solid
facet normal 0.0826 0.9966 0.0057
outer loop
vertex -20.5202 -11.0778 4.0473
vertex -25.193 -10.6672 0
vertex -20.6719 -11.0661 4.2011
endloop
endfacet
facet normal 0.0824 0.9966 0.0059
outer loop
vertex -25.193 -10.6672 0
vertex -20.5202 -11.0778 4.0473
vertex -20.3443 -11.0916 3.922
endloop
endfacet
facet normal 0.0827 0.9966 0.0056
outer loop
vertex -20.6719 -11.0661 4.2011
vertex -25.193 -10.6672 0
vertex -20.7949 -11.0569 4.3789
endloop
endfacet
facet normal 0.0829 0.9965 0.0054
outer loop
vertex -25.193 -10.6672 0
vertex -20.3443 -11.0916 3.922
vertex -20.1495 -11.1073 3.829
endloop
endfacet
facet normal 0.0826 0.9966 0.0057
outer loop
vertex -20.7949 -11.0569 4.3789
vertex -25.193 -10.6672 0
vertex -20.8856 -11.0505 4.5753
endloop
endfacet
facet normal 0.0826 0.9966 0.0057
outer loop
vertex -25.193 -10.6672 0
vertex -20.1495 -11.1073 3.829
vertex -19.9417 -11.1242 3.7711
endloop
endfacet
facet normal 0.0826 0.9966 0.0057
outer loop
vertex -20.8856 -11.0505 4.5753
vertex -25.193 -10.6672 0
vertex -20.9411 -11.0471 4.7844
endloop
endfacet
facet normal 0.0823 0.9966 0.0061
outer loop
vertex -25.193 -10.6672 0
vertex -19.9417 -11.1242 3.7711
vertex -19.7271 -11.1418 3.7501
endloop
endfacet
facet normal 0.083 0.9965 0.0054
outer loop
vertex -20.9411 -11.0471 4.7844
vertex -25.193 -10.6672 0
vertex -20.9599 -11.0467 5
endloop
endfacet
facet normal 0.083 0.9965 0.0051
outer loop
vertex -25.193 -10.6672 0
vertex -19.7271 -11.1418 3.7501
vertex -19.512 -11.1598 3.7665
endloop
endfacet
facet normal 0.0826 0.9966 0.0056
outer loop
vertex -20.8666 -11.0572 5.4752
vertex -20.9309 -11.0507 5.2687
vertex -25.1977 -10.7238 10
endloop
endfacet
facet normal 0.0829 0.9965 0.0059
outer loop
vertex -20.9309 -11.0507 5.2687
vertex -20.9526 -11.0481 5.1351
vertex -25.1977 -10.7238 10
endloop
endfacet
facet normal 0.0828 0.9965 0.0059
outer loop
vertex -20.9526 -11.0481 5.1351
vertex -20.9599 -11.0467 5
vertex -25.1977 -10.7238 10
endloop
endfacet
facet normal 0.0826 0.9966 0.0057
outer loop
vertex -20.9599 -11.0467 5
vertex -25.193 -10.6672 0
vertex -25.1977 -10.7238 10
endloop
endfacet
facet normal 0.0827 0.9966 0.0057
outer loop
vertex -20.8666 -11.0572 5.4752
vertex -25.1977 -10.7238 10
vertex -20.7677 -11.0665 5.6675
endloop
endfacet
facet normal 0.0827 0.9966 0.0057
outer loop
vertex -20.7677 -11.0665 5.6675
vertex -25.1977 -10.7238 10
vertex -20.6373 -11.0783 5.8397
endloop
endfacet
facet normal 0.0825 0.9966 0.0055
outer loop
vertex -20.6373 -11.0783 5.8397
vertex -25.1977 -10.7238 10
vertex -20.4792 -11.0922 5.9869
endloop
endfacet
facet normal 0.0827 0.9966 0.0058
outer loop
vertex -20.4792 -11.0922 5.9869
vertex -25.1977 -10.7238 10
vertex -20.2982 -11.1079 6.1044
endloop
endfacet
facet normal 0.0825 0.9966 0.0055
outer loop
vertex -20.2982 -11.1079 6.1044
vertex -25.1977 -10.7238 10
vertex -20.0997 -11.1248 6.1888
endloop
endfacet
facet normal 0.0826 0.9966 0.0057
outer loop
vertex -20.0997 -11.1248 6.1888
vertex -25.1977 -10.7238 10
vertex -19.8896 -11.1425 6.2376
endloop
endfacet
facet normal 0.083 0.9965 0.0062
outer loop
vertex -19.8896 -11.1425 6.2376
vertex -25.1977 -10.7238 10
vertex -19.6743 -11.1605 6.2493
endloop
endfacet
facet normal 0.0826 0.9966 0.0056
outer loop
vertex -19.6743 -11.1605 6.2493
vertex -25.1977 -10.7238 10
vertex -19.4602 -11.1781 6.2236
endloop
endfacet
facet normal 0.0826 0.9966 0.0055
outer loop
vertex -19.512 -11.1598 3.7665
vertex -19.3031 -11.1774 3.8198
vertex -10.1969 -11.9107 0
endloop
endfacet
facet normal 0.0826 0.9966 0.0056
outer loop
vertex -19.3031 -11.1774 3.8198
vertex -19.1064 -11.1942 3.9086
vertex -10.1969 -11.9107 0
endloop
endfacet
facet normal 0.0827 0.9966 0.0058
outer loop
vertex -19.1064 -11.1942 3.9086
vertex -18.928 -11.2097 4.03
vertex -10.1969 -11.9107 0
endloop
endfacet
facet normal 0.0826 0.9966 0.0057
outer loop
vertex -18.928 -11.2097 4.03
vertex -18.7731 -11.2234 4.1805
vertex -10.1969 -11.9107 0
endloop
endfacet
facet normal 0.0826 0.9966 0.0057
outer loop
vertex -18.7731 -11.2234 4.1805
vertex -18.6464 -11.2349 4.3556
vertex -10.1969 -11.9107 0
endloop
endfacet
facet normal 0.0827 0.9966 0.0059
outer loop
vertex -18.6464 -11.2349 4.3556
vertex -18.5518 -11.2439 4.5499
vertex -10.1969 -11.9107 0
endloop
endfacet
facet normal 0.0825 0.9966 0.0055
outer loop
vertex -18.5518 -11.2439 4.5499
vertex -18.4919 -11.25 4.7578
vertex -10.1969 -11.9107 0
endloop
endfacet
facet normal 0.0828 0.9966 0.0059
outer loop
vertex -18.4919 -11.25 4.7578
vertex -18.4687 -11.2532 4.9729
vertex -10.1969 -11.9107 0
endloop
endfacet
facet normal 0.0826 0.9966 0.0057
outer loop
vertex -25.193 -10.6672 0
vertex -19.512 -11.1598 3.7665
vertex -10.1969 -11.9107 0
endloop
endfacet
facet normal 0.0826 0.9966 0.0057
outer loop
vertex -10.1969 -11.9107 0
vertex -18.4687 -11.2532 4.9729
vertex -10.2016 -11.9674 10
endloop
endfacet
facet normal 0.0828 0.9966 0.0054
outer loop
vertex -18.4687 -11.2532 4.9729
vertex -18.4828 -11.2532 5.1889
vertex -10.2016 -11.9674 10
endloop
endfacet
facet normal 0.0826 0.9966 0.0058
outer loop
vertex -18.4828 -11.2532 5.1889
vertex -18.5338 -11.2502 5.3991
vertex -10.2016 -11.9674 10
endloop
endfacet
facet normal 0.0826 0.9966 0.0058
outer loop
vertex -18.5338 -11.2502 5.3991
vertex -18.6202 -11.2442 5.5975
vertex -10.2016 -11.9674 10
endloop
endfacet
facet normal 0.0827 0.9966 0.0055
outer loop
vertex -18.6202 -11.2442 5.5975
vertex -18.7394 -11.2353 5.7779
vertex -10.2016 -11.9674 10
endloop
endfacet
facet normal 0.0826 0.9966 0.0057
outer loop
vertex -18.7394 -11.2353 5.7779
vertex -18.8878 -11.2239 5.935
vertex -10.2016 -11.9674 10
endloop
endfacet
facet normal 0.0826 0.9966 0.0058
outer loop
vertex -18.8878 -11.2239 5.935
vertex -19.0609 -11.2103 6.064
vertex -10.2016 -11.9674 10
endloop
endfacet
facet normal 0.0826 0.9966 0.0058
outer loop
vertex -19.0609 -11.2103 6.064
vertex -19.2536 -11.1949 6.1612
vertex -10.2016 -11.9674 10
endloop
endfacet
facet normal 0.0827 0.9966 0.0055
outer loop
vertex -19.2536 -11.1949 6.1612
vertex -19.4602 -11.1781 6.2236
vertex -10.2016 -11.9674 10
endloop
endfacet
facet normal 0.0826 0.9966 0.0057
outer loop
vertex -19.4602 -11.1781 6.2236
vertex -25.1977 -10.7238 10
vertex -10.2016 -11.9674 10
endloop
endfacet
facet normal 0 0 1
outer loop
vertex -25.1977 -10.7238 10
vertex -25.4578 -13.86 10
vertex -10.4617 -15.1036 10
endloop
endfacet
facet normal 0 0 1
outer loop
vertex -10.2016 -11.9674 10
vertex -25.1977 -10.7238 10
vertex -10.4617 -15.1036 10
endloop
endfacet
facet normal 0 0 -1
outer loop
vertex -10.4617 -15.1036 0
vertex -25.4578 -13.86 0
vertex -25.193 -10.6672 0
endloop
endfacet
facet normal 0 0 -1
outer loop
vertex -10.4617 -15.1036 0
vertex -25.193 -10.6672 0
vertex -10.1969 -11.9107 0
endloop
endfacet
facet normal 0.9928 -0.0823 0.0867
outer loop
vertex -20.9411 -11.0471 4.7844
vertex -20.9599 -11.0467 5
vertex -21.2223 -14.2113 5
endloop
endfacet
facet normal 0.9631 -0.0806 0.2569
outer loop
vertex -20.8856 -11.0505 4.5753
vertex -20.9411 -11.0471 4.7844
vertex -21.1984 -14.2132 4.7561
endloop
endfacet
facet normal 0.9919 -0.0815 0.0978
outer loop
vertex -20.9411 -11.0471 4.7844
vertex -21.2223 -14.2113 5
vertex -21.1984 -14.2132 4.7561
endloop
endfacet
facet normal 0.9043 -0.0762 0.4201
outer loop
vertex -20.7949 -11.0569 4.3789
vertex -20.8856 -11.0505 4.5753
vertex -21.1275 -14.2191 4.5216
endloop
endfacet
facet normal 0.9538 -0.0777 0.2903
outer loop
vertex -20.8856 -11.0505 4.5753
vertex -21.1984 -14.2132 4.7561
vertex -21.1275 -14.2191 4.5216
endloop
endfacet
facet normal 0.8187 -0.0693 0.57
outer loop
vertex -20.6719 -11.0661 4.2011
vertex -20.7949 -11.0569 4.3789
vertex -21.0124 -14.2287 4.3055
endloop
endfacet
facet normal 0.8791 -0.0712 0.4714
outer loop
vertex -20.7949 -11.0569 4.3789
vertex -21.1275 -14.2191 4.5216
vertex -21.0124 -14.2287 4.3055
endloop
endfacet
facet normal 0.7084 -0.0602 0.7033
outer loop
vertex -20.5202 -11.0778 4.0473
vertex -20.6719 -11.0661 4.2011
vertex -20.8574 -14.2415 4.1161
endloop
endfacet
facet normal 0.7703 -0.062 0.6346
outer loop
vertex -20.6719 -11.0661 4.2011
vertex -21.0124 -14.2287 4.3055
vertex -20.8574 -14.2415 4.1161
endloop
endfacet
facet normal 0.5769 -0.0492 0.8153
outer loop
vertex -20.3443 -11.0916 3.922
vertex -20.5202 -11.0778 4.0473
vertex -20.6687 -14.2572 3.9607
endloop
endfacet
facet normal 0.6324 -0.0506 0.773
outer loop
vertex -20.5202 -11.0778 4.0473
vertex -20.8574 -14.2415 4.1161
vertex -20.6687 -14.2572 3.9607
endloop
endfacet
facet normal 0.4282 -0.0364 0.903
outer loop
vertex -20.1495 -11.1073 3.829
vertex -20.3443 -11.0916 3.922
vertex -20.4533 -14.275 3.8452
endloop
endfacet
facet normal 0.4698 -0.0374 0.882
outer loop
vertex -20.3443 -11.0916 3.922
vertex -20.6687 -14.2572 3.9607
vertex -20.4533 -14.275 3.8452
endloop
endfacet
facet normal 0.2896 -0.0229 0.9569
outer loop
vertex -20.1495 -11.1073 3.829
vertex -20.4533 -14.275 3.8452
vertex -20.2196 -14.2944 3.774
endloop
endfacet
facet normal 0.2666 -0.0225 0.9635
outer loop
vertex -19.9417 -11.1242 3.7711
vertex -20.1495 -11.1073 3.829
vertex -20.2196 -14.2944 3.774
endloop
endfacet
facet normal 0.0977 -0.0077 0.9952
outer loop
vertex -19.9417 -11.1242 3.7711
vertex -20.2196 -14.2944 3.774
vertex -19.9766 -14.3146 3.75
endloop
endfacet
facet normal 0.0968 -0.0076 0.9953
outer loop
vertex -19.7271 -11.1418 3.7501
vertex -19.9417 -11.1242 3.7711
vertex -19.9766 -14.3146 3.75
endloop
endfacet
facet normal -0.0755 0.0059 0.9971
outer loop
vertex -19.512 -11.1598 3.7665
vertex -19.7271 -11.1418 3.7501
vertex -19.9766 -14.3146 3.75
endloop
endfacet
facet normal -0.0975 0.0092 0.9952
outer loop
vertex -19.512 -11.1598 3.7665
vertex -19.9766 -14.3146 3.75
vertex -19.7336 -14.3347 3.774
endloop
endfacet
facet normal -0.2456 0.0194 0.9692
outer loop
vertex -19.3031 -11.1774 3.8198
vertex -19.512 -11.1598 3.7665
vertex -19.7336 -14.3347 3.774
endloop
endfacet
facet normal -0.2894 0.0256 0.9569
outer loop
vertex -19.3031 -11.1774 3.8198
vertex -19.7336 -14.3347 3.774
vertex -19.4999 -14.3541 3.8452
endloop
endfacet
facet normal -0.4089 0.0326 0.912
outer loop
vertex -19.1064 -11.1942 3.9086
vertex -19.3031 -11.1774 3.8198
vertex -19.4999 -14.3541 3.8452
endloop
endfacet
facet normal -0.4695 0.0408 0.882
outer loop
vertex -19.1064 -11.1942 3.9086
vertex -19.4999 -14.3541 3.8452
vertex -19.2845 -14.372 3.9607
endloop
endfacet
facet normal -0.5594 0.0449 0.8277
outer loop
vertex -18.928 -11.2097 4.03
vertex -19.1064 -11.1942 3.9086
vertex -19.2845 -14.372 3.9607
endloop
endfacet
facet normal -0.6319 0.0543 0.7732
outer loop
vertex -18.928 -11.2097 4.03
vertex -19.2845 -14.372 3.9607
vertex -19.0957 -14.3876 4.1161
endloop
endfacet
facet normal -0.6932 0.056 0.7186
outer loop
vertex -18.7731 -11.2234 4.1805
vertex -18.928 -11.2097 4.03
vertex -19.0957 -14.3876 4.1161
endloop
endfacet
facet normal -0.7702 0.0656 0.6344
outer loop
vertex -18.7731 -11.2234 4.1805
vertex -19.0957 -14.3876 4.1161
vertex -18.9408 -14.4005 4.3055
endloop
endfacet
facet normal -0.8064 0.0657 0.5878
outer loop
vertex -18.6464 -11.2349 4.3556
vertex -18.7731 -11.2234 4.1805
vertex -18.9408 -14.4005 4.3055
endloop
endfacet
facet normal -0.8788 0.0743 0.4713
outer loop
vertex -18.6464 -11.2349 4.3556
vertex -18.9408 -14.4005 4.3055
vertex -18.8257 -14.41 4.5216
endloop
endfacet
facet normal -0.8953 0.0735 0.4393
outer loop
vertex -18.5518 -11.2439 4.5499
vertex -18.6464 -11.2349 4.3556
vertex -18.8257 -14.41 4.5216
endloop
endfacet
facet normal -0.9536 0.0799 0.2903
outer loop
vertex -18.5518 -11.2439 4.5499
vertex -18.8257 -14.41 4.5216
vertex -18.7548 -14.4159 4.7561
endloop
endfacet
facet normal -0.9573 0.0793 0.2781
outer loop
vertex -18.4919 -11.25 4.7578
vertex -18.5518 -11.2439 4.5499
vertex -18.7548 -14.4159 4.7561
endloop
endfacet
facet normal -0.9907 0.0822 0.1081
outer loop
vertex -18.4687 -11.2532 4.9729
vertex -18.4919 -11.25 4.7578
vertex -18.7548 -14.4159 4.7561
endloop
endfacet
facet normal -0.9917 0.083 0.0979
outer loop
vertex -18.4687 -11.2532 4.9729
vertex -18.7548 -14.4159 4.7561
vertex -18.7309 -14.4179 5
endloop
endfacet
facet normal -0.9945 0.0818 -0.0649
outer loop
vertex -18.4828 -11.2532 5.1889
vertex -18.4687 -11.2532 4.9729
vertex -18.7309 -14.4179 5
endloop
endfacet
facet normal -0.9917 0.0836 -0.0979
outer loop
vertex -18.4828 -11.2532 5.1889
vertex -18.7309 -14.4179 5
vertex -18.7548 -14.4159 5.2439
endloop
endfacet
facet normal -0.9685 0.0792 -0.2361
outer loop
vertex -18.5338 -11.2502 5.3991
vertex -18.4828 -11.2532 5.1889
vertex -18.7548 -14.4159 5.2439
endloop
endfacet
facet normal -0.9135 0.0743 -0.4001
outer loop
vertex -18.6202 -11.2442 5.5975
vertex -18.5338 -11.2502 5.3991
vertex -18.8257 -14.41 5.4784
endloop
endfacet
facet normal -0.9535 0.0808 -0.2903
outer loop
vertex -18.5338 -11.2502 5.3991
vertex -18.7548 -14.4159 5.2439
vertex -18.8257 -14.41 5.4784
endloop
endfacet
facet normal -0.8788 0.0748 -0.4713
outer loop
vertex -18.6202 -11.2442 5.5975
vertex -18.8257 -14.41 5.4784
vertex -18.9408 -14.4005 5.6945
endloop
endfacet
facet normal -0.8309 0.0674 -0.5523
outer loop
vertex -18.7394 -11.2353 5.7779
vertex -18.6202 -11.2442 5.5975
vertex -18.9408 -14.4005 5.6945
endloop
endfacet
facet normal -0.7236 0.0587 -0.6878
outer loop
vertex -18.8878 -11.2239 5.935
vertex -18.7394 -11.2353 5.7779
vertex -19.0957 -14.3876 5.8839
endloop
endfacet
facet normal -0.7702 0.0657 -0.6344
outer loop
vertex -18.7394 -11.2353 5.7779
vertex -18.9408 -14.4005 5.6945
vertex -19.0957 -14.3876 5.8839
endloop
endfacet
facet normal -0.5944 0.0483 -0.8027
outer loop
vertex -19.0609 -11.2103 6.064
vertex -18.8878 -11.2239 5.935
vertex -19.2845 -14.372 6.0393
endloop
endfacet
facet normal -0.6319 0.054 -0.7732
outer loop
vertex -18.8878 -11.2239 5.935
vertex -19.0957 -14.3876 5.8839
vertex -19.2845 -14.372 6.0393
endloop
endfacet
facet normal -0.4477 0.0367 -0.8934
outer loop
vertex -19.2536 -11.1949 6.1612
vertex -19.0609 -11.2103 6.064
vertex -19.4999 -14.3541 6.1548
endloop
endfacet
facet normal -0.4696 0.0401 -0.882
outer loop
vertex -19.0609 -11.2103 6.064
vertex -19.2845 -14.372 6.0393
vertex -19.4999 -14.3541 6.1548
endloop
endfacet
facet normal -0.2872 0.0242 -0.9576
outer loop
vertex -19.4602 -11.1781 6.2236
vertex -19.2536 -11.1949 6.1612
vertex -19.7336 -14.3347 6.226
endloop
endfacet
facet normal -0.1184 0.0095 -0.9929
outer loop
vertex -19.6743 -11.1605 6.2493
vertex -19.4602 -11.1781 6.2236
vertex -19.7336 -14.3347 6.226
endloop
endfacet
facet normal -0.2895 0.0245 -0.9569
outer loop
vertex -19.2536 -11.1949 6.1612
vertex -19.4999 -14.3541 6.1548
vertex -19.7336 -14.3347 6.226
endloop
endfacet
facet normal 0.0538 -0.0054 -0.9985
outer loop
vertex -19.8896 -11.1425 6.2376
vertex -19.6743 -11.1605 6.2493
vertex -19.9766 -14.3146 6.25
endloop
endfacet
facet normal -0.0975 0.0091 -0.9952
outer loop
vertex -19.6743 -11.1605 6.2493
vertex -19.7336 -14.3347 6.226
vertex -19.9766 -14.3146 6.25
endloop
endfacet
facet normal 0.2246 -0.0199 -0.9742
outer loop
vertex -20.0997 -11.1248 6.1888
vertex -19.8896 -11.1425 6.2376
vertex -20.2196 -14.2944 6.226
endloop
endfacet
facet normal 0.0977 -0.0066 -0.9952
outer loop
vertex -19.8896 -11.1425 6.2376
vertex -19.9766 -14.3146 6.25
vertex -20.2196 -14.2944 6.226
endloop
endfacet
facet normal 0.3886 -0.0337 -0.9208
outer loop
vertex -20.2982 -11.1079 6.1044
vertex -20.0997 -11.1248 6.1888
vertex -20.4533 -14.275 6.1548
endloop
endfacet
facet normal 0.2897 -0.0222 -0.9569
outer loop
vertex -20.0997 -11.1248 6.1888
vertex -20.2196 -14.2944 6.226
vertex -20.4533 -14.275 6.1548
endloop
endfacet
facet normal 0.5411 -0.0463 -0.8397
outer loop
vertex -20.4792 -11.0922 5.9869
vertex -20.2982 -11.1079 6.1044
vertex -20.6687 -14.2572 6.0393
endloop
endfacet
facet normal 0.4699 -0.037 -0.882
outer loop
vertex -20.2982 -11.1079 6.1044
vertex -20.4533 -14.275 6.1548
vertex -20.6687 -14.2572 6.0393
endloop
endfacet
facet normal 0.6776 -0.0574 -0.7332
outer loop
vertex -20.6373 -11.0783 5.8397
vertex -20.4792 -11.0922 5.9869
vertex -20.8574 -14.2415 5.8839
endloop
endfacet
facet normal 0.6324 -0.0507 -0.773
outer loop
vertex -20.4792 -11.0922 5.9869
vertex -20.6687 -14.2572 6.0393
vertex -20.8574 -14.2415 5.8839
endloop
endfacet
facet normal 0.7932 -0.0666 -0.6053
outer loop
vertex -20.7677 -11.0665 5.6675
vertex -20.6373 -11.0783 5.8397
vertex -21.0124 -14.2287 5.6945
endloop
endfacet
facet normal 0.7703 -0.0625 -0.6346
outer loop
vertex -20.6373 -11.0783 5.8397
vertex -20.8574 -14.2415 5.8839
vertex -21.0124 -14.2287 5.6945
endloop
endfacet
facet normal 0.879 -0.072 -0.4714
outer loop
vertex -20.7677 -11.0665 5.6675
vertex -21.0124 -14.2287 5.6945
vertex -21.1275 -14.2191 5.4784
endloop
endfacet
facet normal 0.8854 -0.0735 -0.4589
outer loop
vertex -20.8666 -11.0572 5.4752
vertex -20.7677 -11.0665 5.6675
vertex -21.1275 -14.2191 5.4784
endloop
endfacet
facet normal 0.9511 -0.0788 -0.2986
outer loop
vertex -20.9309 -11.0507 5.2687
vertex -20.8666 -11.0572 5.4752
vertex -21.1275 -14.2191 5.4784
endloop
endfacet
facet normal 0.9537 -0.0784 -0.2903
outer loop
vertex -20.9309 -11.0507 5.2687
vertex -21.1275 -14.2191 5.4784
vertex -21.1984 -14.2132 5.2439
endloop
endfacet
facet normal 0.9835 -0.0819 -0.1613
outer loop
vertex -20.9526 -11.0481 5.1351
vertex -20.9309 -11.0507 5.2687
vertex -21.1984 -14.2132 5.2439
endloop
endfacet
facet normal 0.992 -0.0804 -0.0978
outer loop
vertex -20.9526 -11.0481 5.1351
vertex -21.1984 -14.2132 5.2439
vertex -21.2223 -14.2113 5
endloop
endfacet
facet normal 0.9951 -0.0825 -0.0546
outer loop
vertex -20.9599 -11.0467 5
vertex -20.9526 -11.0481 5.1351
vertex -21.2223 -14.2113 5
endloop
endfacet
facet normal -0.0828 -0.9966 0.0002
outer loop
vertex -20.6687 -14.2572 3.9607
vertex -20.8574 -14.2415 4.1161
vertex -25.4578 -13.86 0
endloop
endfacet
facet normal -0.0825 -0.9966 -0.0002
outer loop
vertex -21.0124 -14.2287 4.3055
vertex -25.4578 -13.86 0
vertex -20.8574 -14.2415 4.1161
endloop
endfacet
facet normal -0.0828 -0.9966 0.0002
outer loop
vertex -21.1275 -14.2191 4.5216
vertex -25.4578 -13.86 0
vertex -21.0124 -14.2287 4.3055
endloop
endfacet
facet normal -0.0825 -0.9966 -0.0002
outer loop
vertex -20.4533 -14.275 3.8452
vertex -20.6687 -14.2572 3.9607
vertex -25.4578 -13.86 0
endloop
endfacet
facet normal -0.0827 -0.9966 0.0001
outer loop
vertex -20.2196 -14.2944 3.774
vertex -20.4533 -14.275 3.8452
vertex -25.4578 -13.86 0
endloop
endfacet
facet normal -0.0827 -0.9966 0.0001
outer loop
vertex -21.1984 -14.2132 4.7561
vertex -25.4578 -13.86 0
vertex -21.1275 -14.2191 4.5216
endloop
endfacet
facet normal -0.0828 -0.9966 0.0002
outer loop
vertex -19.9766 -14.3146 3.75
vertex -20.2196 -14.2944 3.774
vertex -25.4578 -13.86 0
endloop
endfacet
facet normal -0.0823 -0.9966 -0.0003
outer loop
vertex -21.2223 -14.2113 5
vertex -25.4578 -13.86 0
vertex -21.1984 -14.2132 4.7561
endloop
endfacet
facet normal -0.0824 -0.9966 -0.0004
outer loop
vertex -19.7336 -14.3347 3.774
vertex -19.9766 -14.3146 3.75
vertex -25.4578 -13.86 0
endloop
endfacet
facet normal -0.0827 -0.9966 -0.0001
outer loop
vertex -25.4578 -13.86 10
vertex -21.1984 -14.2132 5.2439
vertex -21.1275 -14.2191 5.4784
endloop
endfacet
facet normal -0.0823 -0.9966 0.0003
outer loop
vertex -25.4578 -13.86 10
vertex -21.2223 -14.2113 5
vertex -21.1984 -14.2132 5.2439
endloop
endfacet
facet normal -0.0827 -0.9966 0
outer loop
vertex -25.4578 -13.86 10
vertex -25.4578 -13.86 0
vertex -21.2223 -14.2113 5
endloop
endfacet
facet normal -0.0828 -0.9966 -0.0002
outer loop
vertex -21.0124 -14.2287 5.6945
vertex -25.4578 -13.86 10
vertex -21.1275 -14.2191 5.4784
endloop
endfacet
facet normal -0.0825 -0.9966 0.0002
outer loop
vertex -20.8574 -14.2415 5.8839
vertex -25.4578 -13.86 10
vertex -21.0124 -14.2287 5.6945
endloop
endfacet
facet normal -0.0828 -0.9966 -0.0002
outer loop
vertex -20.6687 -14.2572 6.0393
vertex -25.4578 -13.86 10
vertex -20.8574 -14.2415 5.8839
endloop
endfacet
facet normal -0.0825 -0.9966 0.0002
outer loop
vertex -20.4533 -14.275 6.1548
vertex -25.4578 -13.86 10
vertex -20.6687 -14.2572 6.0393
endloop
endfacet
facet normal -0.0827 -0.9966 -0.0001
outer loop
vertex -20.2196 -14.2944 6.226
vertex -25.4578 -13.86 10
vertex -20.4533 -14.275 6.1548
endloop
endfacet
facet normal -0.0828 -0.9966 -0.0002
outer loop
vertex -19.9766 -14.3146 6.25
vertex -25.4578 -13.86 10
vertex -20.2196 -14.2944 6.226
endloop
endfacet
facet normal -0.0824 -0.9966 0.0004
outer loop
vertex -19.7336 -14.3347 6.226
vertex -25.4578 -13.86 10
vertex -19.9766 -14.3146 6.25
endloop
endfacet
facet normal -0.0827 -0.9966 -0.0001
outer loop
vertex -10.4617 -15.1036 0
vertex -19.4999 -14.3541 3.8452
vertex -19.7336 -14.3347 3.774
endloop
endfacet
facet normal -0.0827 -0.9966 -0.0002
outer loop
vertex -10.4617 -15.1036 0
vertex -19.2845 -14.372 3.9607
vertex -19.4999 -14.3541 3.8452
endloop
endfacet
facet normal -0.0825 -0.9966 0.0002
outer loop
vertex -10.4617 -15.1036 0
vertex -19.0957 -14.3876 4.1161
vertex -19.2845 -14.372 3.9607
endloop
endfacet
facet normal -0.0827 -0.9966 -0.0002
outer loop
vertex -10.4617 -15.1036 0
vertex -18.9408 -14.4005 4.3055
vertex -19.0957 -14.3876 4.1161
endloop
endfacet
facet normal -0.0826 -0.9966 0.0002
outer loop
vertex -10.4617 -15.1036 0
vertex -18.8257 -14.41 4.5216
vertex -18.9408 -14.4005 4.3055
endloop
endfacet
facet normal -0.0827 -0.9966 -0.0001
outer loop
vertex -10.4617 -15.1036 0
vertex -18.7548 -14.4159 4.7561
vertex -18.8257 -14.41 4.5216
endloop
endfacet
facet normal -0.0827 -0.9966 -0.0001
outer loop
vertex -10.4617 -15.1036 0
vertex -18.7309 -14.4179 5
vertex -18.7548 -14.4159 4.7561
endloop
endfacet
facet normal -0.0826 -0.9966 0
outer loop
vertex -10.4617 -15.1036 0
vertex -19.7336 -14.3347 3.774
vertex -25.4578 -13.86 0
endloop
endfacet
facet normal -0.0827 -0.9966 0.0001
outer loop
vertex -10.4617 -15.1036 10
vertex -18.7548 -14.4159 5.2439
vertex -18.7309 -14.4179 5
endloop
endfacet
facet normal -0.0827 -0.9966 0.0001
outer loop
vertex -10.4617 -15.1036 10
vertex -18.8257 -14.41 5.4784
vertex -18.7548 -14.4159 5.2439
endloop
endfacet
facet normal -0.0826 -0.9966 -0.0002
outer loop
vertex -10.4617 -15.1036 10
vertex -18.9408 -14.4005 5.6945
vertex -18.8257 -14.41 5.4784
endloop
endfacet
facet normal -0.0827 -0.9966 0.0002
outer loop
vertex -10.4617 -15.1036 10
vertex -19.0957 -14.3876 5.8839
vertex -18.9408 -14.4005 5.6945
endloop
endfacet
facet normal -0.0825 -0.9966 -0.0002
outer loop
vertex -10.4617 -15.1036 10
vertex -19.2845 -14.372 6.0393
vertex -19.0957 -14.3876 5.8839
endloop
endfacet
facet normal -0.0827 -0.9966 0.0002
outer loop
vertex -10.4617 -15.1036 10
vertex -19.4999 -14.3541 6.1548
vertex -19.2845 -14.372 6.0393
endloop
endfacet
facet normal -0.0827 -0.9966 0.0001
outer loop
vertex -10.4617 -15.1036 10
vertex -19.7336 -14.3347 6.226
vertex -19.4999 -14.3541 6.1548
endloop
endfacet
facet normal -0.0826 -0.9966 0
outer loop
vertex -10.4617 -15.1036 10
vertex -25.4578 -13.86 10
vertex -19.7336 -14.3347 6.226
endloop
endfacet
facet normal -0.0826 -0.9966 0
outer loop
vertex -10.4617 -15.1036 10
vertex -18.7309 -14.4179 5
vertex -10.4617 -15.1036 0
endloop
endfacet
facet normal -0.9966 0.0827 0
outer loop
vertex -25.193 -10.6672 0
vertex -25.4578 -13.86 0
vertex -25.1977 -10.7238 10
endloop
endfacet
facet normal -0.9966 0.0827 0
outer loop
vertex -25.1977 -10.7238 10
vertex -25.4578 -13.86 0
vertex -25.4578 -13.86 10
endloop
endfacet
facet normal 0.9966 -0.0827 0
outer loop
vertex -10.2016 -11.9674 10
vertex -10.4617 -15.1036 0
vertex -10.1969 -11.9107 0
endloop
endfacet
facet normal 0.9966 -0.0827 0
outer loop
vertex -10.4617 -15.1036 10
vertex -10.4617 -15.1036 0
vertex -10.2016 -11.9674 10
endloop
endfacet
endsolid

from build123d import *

# Parameters (mm, degrees)
SKETCH1_W                 = 15.047570974
SKETCH1_H                 = 10
BOSS_EXTRUDE1_DEPTH       = 3.203817716
DRAFT1_ANGLE              = -0.325763712
F_2_CLEARANCE_HOLE1_D     = 2.5
F_2_CLEARANCE_HOLE1_DEPTH = 4.421800182


with BuildPart() as part:
    # Sketch1 → Boss-Extrude1 (new body)
    with BuildSketch(Plane(origin=(-1.315367261, -15.86205167, 0), x_dir=(0.99657932, -0.082641756, 0), z_dir=(-0.082641756, -0.99657932, 0))):
        with Locations((-16.701480395, 5)):
            Rectangle(SKETCH1_W, SKETCH1_H)
    extrude(amount=-BOSS_EXTRUDE1_DEPTH)

    # Draft1
    draft1_faces = [part.faces().sort_by_distance(p)[0] for p in [
        (-17.694948105, -11.288953517, 5),
    ]]
    draft(draft1_faces, Plane(origin=(-25.192997126, -10.66717467, 0), x_dir=(-1, 0, 0), z_dir=(0, 0, -1)), DRAFT1_ANGLE)

    # #2 Clearance Hole1
    with Locations(Plane(origin=(-1.052360177, -12.690441673, 0), x_dir=(0.99657932, -0.082641756, 0), z_dir=(0.082641756, 0.99657932, 0))):
        with Locations((-18.725265882, -5)):
            Hole(F_2_CLEARANCE_HOLE1_D / 2, depth=F_2_CLEARANCE_HOLE1_DEPTH)


solid = part.part
